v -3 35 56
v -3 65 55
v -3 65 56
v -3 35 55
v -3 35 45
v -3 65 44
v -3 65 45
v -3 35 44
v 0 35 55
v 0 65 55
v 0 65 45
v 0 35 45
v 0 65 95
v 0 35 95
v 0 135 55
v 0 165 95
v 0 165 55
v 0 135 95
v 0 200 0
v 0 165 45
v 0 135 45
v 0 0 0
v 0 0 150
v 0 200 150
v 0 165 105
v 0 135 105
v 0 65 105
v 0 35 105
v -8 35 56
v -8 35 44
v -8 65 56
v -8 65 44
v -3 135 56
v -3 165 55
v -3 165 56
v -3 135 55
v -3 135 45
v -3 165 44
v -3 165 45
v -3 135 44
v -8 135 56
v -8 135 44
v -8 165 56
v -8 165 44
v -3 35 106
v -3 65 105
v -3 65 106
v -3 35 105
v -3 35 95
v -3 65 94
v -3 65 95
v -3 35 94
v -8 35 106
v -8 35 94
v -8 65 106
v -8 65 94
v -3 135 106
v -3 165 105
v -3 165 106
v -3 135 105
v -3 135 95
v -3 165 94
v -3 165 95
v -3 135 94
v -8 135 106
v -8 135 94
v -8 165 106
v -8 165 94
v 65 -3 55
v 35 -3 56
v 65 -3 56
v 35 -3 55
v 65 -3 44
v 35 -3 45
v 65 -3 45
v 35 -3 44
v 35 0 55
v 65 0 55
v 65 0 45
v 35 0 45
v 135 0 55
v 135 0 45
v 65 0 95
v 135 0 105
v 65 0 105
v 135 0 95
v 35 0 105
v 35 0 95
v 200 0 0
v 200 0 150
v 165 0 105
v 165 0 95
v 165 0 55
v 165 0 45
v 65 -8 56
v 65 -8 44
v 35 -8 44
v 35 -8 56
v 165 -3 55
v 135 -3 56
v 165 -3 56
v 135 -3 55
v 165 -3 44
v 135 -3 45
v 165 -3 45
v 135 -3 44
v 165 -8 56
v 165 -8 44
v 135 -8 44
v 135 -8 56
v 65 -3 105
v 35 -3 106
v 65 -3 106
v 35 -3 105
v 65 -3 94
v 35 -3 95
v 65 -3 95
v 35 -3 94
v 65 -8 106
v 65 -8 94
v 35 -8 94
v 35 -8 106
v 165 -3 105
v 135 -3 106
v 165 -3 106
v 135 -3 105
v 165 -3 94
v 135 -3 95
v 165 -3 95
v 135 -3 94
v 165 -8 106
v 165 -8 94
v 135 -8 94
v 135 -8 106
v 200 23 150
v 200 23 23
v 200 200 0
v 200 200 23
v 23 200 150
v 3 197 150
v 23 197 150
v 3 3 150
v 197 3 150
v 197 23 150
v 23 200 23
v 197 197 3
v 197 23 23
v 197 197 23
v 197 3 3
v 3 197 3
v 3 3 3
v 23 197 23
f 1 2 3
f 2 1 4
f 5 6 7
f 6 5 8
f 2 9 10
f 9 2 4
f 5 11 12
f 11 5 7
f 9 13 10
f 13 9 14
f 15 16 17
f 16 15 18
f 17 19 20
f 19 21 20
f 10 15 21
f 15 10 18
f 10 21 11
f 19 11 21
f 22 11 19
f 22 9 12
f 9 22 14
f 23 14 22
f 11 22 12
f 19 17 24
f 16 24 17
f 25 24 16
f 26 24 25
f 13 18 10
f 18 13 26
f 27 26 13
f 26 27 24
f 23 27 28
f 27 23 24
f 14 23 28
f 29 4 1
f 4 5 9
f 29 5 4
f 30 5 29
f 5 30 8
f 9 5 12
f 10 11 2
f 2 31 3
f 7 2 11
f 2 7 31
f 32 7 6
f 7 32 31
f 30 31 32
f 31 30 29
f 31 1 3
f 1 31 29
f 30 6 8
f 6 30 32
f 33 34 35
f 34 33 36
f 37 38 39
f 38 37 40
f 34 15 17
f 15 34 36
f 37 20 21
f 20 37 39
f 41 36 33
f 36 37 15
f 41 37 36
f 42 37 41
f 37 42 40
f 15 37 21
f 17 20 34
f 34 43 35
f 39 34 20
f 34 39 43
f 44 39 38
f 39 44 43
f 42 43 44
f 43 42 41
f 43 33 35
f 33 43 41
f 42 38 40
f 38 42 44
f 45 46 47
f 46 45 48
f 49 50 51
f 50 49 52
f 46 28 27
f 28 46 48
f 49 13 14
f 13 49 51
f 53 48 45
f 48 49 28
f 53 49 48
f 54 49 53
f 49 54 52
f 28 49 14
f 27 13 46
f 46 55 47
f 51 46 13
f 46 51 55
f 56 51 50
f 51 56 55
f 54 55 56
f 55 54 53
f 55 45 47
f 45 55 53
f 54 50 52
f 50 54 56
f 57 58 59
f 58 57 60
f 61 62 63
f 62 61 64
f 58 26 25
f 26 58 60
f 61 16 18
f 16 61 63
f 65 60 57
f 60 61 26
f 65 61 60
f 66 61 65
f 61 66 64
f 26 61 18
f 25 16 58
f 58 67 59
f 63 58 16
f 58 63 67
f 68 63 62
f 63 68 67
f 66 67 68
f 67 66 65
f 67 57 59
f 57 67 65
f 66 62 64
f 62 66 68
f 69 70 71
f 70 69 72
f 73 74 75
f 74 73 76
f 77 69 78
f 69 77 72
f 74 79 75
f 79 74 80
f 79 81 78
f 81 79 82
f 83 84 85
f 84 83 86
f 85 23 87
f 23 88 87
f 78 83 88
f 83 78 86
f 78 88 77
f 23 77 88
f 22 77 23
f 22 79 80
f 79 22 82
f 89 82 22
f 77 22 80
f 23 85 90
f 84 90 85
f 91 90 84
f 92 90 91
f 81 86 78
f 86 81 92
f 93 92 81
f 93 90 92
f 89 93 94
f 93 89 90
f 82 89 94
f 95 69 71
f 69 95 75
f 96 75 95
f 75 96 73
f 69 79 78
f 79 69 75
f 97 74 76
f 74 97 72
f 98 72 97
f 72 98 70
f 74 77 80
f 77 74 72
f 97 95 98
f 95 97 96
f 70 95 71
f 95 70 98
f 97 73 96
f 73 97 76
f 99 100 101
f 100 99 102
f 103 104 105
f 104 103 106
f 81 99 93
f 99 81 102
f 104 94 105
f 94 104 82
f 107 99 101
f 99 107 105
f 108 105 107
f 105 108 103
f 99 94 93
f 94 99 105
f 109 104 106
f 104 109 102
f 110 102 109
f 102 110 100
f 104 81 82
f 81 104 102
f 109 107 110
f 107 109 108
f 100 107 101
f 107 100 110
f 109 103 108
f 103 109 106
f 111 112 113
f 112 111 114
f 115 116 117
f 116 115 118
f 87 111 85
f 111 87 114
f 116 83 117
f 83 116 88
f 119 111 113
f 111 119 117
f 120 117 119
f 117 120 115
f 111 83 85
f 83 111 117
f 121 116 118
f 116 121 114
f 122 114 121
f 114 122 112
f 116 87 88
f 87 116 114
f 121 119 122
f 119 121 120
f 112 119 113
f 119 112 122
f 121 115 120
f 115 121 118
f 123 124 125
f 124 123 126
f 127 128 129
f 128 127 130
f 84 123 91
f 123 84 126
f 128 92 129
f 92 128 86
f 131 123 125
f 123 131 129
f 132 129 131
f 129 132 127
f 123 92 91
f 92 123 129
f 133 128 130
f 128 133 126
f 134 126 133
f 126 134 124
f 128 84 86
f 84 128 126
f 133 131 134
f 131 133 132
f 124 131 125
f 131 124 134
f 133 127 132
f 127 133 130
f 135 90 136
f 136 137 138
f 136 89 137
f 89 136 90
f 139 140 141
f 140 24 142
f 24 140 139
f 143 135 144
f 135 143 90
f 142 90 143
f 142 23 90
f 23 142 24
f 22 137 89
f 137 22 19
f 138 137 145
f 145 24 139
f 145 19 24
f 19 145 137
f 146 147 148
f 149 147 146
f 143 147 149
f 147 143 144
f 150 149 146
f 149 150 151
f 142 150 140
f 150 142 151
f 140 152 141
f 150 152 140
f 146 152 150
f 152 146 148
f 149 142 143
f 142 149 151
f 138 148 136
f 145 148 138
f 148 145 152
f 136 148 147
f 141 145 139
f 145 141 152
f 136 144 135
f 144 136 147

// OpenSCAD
print_outer = true;
print_inner = false;

//length and width
l = 200;
//height
h = 150;

//thickness of walls
s = 3;

//margin for window
m = 20;

//for compensate imprecise print
e = 1;

//bit integer
b = 1000000;

//vertical distance between holder
hdy = 50;
//horizontal distance between holder
hdx = 100;

//holder width 1
hw1 = 10;
//holder width 2
hw2 = 12;
//holder length 1
hd1 = 3;
//holder length 2
hd2 = 5;
//holder zize
hl = 30;
 
module holder(hw1,hw2,hd1,hd2,hl) {
    translate([0,-hl/2,-hw1/2])cube([hd1,hl,hw1]);
    translate([hd1,-hl/2,-hw2/2]) cube([hd2,hl,hw2]);
} 



if(print_outer){
    translate([0,(l-hdx)/2,(h-hdy)/2])rotate([0,0,180])holder(hw1,hw2,hd1,hd2,hl);
    translate([0,(l+hdx)/2,(h-hdy)/2])rotate([0,0,180])holder(hw1,hw2,hd1,hd2,hl);
    translate([0,(l-hdx)/2,(h+hdy)/2])rotate([0,0,180])holder(hw1,hw2,hd1,hd2,hl);
    translate([0,(l+hdx)/2,(h+hdy)/2])rotate([0,0,180])holder(hw1,hw2,hd1,hd2,hl);

    translate([(l-hdx)/2,0,(h-hdy)/2])rotate([0,0,-90])holder(hw1,hw2,hd1,hd2,hl);
    translate([(l+hdx)/2,0,(h-hdy)/2])rotate([0,0,-90])holder(hw1,hw2,hd1,hd2,hl);
    translate([(l-hdx)/2,0,(h+hdy)/2])rotate([0,0,-90])holder(hw1,hw2,hd1,hd2,hl);
    translate([(l+hdx)/2,0,(h+hdy)/2])rotate([0,0,-90])holder(hw1,hw2,hd1,hd2,hl);


    difference(){
        cube([l,l,h]);
        translate([s,s,s])cube([l-2*s,l-2*s,h]);
        translate([s+m,s+m,s+m]) {
            cube([b,b,b]);    

        }
    }
}
if(print_inner) {
    difference(){
        translate([s+e,s+e,s])cube([l-s*2-e*2,l-s*2-e*2,h-s]);
        translate([s*2+e,s*2+e,s*2])cube([l-s*4-e*2,l-s*4-e*2,h-s]);
        translate([s+m,s+m,s+m]) {
            cube([l-2*(s+m),b,b]);    
            cube([b,l-2*(s+m),b]);    

        }
    }
}
